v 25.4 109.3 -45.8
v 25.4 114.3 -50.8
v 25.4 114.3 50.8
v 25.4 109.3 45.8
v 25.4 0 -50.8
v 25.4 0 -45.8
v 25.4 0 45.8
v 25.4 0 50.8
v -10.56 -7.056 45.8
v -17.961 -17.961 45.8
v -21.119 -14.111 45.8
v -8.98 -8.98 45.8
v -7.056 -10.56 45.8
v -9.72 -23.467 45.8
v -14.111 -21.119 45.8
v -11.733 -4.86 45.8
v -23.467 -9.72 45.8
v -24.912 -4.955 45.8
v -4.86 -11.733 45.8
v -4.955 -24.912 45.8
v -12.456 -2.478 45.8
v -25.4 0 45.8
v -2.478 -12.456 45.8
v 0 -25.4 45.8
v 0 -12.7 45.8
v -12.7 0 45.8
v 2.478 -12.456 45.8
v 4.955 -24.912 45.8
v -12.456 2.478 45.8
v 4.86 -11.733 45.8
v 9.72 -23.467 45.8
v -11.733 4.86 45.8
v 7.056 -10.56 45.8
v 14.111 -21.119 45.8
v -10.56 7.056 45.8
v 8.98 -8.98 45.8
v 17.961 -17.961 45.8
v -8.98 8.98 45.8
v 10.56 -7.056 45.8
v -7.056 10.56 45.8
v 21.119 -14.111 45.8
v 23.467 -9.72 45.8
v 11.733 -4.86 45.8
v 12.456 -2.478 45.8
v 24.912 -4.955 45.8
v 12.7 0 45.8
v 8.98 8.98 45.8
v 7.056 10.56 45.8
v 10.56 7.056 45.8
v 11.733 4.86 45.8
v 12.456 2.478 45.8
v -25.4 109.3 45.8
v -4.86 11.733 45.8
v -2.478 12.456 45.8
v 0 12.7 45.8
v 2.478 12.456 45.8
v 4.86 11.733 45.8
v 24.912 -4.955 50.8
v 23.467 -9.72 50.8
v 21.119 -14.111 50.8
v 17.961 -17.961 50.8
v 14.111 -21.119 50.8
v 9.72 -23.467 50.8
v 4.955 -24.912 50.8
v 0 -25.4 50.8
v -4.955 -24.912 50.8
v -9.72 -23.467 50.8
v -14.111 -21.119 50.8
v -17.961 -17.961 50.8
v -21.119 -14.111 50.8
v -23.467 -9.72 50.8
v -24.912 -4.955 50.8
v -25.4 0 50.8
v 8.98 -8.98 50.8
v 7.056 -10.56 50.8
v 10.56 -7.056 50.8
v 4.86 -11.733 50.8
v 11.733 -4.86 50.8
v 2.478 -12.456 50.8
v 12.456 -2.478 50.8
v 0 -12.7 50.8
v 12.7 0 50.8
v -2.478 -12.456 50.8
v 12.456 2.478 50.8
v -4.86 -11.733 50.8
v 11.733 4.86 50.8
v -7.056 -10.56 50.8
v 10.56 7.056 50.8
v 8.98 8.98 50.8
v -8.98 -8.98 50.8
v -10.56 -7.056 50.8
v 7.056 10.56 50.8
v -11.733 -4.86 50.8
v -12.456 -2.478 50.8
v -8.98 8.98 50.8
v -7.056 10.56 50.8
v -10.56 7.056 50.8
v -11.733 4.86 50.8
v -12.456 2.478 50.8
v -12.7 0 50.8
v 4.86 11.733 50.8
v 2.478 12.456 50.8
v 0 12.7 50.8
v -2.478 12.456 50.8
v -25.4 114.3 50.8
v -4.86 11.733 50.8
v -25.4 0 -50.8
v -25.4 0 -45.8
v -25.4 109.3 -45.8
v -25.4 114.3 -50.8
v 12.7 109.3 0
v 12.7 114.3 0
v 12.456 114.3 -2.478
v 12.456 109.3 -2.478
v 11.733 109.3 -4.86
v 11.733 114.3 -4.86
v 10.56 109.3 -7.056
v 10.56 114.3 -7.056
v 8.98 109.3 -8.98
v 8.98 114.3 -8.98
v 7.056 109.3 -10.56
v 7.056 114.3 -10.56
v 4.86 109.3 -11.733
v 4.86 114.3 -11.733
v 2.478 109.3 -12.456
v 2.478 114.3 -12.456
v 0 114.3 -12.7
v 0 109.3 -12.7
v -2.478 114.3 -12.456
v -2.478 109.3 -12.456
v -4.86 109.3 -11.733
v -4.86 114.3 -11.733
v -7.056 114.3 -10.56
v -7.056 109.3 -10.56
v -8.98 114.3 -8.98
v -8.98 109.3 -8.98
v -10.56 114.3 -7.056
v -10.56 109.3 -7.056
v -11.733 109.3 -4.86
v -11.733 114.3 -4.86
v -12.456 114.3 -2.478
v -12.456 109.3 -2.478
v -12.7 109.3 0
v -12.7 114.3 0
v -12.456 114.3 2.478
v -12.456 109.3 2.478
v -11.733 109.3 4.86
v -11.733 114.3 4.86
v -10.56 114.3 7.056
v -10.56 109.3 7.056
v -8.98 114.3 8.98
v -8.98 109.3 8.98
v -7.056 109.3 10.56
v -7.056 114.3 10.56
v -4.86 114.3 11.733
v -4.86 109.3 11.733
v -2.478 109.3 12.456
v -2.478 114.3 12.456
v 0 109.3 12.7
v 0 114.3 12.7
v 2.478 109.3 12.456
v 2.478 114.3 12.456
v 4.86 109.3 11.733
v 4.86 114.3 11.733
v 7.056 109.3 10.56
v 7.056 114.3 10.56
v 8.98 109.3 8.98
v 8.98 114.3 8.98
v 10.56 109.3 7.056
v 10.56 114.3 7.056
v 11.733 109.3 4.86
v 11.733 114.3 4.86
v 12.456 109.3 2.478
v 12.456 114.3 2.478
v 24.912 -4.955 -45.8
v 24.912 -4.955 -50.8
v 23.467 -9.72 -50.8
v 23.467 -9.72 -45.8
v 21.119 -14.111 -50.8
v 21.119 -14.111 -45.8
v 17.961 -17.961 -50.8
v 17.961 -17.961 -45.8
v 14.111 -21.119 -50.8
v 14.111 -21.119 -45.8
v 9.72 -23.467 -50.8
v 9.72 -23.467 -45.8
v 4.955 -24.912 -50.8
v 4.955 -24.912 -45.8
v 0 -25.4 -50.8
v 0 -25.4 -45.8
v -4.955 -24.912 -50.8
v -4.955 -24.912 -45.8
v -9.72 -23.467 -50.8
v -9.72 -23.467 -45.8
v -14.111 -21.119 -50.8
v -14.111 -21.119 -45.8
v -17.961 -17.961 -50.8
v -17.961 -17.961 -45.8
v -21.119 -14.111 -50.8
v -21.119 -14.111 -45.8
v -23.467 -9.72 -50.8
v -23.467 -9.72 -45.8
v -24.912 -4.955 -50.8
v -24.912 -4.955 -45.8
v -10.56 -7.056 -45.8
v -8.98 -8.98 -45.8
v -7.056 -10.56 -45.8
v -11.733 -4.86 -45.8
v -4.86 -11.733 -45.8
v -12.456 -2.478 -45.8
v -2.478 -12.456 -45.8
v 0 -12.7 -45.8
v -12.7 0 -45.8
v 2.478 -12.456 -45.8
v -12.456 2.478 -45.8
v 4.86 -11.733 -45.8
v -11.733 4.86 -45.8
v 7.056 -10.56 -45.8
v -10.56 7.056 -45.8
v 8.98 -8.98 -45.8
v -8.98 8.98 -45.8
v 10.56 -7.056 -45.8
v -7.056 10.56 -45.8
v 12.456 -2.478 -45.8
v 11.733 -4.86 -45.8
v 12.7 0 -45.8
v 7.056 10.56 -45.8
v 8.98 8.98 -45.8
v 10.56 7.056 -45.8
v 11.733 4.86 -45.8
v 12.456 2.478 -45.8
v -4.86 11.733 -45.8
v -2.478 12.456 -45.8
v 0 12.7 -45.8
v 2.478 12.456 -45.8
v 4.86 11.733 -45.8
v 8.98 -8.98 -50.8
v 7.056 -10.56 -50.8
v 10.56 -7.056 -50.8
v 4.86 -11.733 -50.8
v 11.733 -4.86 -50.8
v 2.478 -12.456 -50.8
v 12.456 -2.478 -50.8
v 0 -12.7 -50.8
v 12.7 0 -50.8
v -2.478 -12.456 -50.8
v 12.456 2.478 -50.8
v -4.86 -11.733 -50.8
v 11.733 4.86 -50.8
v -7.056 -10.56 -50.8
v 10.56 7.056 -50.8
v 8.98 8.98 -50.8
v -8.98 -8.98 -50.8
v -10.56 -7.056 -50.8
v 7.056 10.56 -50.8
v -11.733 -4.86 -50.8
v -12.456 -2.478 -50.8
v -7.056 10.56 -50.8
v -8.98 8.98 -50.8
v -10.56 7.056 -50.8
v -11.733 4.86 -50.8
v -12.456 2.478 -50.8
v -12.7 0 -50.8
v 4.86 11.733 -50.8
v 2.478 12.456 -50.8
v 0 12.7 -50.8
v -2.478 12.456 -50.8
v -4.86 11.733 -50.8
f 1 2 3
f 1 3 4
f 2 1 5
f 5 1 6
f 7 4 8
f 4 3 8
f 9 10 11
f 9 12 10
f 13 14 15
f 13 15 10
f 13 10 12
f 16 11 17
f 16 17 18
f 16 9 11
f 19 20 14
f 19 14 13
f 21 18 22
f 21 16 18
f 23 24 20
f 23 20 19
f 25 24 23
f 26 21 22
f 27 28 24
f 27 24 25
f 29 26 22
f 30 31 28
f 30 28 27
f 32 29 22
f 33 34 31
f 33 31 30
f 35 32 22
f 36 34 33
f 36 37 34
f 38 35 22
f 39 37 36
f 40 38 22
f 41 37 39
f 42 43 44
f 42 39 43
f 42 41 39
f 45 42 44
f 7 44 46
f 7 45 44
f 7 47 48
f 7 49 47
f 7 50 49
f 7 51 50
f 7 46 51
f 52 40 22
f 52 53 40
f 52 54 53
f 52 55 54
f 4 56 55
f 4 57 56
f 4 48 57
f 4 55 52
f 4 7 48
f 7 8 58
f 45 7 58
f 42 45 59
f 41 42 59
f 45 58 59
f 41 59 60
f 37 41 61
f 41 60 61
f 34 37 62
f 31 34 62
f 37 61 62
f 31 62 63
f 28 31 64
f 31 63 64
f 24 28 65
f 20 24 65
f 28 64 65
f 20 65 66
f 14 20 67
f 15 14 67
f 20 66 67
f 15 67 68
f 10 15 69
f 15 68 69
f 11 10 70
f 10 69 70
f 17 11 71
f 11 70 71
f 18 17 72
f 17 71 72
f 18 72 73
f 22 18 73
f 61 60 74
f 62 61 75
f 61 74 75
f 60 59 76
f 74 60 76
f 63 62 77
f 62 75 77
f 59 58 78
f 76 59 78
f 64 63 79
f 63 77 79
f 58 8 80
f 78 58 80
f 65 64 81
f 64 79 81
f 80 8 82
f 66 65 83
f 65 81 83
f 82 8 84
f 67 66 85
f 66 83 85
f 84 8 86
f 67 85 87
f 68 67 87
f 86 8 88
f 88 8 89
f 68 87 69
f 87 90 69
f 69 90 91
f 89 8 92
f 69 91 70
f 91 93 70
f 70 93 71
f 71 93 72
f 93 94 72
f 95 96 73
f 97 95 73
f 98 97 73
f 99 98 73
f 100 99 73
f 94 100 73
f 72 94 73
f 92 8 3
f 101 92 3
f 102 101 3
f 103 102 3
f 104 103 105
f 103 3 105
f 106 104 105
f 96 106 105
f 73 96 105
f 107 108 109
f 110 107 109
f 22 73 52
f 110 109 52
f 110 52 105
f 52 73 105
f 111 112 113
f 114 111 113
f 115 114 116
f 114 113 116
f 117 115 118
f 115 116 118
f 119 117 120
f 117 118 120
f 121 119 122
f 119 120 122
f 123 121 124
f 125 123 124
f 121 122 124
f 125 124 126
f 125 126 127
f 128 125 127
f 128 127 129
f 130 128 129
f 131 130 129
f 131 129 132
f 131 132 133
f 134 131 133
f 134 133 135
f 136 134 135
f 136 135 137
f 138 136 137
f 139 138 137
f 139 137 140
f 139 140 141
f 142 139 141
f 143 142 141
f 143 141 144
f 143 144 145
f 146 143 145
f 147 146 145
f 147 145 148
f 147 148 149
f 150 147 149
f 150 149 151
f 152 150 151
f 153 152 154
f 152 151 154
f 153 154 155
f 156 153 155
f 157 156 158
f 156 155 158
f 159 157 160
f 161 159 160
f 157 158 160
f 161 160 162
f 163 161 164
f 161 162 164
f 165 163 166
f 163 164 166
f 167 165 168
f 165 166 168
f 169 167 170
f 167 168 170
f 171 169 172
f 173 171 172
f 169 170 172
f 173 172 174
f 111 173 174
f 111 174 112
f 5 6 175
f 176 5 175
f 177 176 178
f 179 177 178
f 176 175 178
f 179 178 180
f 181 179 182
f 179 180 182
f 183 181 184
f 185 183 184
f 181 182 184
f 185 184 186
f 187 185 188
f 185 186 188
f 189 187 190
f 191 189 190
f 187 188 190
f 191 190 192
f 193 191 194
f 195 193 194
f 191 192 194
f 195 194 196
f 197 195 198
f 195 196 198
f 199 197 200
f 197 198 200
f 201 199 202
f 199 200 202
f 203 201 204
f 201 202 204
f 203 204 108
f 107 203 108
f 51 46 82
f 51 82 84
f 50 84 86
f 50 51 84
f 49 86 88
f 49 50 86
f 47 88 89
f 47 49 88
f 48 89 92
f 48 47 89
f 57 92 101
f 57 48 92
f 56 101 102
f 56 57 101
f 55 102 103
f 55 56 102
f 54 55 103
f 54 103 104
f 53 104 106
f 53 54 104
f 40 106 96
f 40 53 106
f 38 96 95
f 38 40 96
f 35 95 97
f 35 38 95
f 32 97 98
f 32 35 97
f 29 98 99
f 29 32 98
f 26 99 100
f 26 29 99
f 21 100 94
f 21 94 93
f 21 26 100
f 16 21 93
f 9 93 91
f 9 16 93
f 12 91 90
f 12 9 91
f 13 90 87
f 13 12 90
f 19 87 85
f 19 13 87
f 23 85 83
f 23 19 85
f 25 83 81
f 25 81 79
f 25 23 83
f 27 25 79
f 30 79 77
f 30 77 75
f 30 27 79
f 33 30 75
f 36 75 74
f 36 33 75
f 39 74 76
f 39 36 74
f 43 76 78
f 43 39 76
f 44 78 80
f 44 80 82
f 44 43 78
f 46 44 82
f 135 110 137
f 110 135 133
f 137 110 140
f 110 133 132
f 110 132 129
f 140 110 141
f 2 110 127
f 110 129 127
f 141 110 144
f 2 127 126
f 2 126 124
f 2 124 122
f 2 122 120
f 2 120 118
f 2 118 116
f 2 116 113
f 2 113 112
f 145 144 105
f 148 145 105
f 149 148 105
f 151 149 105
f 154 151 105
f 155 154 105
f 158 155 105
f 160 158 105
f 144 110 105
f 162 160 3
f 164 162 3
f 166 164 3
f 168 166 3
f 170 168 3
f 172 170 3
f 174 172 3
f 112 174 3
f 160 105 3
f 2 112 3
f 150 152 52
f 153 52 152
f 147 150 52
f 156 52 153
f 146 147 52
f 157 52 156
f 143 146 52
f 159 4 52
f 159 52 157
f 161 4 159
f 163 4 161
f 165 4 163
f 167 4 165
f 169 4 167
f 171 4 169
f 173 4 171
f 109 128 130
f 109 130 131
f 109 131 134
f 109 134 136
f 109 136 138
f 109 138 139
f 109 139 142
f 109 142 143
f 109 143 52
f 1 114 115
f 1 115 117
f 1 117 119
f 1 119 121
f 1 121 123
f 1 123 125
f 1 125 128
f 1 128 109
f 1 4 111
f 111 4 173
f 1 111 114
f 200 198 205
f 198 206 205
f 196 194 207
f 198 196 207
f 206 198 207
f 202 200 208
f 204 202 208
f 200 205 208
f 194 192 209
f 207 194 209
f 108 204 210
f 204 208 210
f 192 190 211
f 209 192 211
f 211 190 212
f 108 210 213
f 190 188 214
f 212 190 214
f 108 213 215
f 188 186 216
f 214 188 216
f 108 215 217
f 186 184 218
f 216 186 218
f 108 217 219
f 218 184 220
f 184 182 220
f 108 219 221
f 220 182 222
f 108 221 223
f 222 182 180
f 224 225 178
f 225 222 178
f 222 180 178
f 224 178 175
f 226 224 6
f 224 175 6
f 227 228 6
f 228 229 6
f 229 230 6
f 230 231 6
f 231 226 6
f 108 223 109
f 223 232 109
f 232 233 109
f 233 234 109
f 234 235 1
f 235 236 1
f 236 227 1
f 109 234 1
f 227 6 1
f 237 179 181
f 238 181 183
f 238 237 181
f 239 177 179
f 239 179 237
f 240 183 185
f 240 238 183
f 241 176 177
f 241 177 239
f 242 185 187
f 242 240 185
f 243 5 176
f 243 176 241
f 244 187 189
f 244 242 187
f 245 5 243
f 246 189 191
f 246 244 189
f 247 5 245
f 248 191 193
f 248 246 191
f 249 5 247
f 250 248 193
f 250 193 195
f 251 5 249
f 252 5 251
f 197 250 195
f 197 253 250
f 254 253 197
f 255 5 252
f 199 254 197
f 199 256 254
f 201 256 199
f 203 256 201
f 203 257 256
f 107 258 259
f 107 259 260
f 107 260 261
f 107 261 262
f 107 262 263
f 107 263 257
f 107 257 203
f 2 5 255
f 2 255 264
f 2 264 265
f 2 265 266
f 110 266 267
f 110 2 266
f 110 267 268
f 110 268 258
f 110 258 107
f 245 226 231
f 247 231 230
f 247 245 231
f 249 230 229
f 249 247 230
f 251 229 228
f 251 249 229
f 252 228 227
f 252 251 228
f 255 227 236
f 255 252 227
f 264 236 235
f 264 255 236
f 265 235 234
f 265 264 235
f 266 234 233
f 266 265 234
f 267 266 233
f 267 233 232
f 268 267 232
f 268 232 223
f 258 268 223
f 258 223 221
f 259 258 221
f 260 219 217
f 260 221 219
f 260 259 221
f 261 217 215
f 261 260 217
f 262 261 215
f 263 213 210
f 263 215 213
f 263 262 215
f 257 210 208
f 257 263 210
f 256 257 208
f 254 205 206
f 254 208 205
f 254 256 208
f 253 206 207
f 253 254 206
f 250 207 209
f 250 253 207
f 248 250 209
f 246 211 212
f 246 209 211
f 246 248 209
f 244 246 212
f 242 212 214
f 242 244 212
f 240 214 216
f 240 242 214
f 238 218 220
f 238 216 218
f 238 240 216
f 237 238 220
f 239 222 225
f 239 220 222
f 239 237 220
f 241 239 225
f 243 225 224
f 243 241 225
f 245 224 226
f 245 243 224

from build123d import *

# Parameters (mm, degrees)
SKETCH1_R           = 12.7
BOSS_EXTRUDE1_DEPTH = 50.8
SKETCH2_W           = 91.6
SKETCH2_H           = 134.7
CUT_EXTRUDE1_DEPTH  = 101.6
SKETCH3_R           = 12.7
CUT_EXTRUDE2_DEPTH  = 101.6


with BuildPart() as part:
    # Sketch1 → Boss-Extrude1 (new, symmetric)
    with BuildSketch(Plane.XY):
        with BuildLine():
            Line((-25.4, 0), (-25.4, 114.3))
            Line((-25.4, 114.3), (25.4, 114.3))
            Line((25.4, 114.3), (25.4, 0))
            ThreePointArc((25.4, 0), (0, -25.4), (-25.4, 0))
        make_face()
        Circle(SKETCH1_R, mode=Mode.SUBTRACT)
    extrude(amount=BOSS_EXTRUDE1_DEPTH, both=True)

    # Sketch2 → Cut-Extrude1 (cut)
    with BuildSketch(Plane(origin=(25.4, 0, 0), x_dir=(0, 0, -1), z_dir=(1, 0, 0))):
        with Locations((0, 41.95)):
            Rectangle(SKETCH2_W, SKETCH2_H)
    extrude(amount=-CUT_EXTRUDE1_DEPTH, mode=Mode.SUBTRACT)

    # Sketch3 → Cut-Extrude2 (cut)
    with BuildSketch(Plane(origin=(0, 114.3, 0), x_dir=(1, 0, 0), z_dir=(0, 1, 0))):
        Circle(SKETCH3_R)
    extrude(amount=-CUT_EXTRUDE2_DEPTH, mode=Mode.SUBTRACT)


solid = part.part
